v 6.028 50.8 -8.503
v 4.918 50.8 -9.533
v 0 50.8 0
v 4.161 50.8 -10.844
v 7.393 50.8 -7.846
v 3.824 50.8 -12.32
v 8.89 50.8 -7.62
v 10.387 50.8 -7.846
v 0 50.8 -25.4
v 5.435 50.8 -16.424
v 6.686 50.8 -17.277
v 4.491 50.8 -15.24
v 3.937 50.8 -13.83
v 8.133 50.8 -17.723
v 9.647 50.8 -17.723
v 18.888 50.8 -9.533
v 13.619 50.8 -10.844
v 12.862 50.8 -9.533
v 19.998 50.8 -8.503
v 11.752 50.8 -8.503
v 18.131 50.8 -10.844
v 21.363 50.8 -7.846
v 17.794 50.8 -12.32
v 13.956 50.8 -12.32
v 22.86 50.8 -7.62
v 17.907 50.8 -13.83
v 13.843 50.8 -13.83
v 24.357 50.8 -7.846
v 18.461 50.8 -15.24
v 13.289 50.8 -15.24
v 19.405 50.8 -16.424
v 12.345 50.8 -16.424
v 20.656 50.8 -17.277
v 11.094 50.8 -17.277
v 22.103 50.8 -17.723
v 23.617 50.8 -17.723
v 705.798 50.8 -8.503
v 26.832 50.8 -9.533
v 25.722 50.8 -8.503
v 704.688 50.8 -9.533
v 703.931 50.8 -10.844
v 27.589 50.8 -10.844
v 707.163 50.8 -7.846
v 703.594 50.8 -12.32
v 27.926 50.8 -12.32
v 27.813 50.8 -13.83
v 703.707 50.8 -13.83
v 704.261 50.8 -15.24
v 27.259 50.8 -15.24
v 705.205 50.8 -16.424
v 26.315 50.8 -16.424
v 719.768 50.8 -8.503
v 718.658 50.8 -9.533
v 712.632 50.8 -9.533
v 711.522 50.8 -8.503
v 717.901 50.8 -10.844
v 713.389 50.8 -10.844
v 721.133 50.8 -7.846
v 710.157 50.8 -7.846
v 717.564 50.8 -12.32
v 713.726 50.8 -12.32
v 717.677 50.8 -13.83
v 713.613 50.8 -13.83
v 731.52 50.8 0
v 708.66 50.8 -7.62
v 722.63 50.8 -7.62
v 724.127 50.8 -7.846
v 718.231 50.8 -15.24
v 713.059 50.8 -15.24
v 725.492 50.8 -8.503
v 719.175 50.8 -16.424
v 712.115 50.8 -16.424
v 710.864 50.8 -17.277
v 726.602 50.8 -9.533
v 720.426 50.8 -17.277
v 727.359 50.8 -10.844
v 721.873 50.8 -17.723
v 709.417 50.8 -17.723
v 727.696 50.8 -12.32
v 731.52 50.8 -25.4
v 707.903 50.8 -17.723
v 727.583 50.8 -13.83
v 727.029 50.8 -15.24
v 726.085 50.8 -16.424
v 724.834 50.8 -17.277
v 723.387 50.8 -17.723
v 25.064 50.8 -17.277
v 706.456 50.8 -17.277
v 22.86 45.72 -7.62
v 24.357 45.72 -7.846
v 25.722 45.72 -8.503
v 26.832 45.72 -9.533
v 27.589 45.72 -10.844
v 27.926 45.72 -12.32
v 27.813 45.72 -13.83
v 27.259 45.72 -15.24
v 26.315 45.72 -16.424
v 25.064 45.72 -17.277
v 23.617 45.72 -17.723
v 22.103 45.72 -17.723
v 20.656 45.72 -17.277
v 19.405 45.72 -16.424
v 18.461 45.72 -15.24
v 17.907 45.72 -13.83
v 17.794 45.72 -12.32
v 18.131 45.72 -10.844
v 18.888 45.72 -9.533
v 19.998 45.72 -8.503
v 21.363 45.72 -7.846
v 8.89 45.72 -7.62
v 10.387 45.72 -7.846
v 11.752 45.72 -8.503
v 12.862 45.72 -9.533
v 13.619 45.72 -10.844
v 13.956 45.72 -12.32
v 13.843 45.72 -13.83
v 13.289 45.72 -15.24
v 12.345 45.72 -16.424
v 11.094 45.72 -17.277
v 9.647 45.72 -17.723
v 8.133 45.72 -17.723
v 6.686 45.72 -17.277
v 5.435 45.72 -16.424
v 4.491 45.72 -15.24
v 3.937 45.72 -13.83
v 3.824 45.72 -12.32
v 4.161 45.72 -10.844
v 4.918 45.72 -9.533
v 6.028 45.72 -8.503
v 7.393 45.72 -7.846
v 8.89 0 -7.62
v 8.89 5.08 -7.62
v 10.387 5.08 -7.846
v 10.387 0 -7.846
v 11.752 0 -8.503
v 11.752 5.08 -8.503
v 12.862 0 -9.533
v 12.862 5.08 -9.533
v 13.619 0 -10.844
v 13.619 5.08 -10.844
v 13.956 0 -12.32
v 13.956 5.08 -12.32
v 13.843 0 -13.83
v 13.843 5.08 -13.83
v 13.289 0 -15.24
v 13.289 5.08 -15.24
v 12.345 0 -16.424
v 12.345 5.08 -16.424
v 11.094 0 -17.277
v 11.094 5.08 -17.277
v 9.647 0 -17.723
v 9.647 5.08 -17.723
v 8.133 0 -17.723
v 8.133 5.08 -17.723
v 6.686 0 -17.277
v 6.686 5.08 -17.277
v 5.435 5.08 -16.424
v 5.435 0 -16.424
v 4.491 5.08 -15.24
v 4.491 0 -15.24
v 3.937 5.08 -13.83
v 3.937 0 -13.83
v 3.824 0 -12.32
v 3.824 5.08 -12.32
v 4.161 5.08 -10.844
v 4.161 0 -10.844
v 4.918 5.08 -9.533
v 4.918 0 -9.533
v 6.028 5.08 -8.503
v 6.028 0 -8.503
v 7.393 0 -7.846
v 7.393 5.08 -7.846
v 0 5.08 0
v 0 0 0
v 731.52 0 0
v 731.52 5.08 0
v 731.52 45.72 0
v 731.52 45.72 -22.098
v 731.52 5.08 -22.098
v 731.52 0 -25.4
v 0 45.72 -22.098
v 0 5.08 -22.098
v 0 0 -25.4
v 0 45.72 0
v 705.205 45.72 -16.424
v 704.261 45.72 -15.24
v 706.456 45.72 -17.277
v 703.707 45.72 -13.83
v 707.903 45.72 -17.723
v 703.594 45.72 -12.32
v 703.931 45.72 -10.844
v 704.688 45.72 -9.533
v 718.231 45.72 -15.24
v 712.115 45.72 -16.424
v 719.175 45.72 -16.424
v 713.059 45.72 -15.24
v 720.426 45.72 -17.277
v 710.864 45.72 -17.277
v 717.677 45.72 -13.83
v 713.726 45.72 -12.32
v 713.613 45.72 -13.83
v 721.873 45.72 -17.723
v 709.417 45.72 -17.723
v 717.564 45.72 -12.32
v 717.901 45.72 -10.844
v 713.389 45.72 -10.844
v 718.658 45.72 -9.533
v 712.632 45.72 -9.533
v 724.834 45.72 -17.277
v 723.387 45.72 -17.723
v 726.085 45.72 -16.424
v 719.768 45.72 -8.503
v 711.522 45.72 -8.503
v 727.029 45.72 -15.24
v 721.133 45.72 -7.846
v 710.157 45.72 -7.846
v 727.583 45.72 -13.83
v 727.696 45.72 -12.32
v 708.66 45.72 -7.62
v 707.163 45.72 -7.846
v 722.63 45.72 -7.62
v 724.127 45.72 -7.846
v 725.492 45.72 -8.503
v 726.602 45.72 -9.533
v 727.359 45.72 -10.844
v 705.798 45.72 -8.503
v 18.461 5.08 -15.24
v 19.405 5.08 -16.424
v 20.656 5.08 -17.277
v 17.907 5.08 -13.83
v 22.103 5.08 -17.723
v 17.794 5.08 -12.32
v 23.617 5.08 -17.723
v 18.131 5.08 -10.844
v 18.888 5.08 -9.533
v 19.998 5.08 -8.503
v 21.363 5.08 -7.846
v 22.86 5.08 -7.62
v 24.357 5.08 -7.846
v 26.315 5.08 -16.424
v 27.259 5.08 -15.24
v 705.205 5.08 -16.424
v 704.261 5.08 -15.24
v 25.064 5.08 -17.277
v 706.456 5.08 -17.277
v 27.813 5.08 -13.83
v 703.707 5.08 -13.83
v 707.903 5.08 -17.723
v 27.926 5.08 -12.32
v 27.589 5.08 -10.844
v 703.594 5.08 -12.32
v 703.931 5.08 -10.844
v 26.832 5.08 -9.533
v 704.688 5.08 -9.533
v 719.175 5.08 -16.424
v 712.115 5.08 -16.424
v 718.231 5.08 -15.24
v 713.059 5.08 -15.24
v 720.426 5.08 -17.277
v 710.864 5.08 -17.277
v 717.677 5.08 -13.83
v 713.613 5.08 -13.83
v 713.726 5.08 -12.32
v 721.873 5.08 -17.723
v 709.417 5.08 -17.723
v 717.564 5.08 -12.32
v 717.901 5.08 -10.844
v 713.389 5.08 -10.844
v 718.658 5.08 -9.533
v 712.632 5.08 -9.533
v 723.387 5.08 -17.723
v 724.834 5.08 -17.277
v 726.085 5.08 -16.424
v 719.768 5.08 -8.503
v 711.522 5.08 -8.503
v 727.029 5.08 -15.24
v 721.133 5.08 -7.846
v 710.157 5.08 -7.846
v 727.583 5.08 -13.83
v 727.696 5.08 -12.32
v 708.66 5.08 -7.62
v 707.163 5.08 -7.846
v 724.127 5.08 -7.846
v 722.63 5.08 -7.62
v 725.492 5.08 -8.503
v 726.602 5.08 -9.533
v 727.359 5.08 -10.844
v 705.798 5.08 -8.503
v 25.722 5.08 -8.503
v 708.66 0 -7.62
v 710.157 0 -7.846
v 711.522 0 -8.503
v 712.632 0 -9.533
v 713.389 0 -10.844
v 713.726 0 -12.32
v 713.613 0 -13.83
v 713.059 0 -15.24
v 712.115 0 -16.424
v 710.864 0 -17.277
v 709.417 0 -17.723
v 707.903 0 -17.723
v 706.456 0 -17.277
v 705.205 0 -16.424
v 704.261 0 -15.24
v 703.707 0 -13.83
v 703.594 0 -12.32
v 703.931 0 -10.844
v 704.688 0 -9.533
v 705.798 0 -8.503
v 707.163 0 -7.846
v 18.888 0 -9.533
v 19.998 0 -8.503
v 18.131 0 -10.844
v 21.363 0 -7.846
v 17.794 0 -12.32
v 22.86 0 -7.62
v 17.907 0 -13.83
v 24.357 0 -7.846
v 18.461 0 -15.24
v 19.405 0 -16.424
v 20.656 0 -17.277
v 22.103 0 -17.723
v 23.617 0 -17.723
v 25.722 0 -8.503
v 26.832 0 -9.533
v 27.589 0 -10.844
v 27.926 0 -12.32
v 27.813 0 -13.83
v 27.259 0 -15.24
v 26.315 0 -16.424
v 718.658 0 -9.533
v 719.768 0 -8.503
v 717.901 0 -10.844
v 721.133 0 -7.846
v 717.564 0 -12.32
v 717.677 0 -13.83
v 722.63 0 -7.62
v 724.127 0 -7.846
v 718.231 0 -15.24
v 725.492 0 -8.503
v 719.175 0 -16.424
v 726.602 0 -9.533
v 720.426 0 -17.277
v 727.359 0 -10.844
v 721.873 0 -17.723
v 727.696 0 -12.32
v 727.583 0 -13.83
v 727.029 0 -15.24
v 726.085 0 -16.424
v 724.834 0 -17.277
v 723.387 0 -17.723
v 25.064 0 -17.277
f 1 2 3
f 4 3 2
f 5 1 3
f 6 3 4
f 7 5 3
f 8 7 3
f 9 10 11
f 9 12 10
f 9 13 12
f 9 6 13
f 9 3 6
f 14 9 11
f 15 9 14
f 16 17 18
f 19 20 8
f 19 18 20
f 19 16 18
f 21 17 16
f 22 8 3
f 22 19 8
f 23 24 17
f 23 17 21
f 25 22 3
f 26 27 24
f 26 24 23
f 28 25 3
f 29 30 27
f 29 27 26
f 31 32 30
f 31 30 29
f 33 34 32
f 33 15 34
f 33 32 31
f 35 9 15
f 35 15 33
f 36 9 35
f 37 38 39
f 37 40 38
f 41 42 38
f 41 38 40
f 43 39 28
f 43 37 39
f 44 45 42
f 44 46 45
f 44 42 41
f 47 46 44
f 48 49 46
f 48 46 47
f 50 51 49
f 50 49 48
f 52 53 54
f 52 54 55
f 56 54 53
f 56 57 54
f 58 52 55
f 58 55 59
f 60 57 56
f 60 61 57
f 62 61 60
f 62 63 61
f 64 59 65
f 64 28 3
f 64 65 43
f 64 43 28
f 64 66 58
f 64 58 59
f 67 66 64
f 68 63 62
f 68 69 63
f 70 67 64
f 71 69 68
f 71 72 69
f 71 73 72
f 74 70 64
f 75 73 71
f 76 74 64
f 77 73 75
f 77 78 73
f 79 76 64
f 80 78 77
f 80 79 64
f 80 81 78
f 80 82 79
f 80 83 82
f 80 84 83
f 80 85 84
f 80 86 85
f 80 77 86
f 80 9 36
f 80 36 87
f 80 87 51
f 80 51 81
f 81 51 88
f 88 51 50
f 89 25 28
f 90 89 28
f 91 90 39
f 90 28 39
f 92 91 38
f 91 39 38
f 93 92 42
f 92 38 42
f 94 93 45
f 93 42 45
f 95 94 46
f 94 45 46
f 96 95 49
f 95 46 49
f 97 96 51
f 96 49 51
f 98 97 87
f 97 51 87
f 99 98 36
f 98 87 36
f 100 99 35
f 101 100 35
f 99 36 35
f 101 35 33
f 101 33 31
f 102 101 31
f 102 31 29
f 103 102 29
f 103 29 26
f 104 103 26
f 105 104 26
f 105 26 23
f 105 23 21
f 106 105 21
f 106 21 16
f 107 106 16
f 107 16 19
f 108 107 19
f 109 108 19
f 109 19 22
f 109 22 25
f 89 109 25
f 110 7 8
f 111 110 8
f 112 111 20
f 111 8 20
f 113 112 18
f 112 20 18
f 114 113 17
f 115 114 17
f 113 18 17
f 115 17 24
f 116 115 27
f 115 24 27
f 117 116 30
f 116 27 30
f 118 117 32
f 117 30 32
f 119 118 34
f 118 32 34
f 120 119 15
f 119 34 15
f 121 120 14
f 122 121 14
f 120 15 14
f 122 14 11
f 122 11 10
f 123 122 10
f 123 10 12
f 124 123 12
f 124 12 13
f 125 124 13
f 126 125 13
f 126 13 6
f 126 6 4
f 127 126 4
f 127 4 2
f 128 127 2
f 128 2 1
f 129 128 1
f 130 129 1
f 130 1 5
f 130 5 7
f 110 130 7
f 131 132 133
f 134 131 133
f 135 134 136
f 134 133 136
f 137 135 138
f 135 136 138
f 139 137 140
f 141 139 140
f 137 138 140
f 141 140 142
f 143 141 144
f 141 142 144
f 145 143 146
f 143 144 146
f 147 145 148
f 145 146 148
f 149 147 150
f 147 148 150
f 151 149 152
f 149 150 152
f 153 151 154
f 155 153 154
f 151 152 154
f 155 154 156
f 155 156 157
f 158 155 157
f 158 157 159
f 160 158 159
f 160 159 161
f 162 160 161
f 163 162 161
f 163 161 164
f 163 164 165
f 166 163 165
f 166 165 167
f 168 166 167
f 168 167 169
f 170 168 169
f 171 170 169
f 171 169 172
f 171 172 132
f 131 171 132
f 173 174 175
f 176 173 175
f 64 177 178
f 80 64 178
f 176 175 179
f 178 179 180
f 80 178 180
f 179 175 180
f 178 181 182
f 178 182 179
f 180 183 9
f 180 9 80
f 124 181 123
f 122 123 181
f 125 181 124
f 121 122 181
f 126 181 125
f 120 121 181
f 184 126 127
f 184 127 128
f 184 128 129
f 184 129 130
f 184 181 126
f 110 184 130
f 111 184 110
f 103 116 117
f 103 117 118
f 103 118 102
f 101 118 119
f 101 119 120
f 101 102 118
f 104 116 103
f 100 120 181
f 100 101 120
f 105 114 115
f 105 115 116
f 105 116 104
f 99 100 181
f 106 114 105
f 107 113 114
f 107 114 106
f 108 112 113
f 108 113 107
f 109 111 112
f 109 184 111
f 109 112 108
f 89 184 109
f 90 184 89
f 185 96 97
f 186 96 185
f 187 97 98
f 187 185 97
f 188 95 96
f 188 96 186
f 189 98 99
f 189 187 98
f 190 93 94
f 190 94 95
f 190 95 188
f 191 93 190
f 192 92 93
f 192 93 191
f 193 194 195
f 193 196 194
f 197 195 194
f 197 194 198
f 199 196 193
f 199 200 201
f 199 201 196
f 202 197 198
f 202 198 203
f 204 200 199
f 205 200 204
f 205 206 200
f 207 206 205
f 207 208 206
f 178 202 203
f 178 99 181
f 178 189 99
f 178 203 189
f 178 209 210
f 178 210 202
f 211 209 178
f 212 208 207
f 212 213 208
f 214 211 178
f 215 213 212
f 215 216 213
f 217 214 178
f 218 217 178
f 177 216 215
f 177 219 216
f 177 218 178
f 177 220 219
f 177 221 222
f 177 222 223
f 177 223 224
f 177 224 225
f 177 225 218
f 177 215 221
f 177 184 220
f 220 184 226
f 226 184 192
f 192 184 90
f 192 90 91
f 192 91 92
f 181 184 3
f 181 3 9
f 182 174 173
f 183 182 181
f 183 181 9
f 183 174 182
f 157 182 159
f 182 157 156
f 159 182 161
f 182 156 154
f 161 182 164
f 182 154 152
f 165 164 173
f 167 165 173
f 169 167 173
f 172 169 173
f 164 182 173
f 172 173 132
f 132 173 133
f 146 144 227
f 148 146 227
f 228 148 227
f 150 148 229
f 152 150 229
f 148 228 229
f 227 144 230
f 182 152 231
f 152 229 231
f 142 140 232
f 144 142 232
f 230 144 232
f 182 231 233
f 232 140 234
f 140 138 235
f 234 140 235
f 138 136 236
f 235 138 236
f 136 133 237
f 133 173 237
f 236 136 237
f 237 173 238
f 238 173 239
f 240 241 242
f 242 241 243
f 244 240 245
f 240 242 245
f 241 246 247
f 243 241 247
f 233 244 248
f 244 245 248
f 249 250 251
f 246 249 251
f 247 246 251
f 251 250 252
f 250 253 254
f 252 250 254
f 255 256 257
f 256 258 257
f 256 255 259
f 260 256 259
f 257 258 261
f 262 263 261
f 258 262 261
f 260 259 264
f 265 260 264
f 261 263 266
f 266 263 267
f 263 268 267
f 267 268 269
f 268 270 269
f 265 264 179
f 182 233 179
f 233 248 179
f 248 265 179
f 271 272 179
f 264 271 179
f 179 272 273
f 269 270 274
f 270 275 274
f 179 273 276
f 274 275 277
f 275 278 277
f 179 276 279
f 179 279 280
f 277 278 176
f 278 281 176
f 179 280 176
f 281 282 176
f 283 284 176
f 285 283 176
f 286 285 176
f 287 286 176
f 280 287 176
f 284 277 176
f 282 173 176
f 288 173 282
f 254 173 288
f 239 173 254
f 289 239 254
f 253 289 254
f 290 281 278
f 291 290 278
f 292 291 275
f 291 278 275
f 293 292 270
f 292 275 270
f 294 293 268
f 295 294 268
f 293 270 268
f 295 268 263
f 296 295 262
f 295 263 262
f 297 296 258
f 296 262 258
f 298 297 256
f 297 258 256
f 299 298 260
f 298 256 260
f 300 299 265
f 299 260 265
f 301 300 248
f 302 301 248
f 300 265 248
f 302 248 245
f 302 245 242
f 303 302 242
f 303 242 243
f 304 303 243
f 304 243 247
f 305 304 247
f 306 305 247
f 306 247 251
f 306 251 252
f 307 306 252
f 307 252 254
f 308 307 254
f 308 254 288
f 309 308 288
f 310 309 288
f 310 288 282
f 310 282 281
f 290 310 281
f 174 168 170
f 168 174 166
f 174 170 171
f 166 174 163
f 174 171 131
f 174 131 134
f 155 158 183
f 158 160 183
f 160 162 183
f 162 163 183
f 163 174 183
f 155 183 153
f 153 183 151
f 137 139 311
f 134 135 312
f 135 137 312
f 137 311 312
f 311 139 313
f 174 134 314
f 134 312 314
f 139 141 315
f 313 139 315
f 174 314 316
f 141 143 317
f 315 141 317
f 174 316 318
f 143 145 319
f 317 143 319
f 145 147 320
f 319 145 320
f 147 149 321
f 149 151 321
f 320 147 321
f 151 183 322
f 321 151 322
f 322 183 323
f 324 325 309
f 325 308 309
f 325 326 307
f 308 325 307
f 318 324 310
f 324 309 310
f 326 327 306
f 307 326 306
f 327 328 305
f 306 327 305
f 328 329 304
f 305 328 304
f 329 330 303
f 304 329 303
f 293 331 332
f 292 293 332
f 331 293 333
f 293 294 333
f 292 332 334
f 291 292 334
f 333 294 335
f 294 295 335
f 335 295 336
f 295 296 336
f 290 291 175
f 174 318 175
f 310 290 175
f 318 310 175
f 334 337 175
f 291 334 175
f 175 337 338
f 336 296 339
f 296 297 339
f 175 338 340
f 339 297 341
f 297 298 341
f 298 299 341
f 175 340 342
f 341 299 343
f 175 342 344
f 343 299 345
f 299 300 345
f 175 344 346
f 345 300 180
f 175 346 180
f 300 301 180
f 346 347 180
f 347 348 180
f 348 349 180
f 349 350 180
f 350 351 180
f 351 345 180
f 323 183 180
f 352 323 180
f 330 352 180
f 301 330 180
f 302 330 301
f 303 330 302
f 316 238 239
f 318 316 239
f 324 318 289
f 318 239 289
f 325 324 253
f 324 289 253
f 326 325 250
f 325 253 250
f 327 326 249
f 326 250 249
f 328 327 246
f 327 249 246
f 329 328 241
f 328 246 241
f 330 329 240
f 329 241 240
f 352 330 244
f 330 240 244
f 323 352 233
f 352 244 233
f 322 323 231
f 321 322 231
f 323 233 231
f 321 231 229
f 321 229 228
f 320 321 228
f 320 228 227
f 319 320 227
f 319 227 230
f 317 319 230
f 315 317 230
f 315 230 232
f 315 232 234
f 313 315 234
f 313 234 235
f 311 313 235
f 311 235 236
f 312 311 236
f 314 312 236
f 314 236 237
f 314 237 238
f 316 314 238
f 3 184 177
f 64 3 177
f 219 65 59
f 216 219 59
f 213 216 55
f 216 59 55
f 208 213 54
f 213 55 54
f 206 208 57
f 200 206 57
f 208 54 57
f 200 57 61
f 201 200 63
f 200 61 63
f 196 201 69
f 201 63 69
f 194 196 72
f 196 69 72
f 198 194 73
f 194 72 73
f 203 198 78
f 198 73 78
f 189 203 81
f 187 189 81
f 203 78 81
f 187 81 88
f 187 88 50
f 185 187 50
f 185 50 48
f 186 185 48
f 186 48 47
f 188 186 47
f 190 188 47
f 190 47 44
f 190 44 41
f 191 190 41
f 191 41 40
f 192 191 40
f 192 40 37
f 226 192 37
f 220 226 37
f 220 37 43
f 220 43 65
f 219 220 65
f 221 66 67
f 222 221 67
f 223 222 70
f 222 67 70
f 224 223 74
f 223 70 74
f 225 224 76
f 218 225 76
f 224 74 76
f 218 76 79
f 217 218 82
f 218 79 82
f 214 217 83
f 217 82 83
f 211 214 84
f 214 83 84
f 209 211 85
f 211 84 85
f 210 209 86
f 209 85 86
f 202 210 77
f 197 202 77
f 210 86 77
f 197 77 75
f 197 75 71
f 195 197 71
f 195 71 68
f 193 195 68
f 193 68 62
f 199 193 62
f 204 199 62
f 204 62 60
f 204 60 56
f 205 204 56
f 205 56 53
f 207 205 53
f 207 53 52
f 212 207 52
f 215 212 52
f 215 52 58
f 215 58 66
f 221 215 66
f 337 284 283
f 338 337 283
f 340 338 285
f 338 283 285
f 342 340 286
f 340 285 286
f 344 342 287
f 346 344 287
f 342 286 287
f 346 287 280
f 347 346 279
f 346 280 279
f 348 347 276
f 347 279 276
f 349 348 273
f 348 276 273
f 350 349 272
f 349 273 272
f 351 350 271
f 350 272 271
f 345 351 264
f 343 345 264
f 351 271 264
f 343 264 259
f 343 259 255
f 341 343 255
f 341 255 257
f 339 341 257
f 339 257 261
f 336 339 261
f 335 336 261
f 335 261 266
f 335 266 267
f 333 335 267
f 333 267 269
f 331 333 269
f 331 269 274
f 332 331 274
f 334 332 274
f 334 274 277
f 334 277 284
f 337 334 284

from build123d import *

# Parameters (mm, degrees)
SKETCH1_W           = 731.52
SKETCH1_H           = 25.4
BOSS_EXTRUDE1_DEPTH = 50.8
SKETCH2_R           = 5.08
CUT_EXTRUDE1_DEPTH  = 53.34
SKETCH5_W           = 731.52
SKETCH5_H           = 40.64
CUT_EXTRUDE4_DEPTH  = 22.098


with BuildPart() as part:
    # Sketch1 → Boss-Extrude1 (new body)
    with BuildSketch(Plane(origin=(0, 0, 0), x_dir=(1, 0, 0), z_dir=(0, 1, 0))):
        with Locations((365.76, 12.7)):
            Rectangle(SKETCH1_W, SKETCH1_H)
    extrude(amount=BOSS_EXTRUDE1_DEPTH)

    # Sketch2 → Cut-Extrude1 (cut)
    with BuildSketch(Plane(origin=(0, 50.8, 0), x_dir=(1, 0, 0), z_dir=(0, 1, 0))):
        with Locations(Location((8.89, 12.7, 0), (0, 0, 270))):
            Circle(SKETCH2_R)
        with Locations(Location((22.86, 12.7, 0), (0, 0, 270))):
            Circle(SKETCH2_R)
        with Locations(Location((722.63, 12.7, 0), (0, 0, 270))):
            Circle(SKETCH2_R)
        with Locations(Location((708.66, 12.7, 0), (0, 0, 270))):
            Circle(SKETCH2_R)
    extrude(amount=-CUT_EXTRUDE1_DEPTH, mode=Mode.SUBTRACT)

    # Sketch5 → Cut-Extrude4 (cut)
    with BuildSketch(Plane.XY):
        with Locations((365.76, 25.4)):
            Rectangle(SKETCH5_W, SKETCH5_H)
    extrude(amount=-CUT_EXTRUDE4_DEPTH, mode=Mode.SUBTRACT)


solid = part.part
